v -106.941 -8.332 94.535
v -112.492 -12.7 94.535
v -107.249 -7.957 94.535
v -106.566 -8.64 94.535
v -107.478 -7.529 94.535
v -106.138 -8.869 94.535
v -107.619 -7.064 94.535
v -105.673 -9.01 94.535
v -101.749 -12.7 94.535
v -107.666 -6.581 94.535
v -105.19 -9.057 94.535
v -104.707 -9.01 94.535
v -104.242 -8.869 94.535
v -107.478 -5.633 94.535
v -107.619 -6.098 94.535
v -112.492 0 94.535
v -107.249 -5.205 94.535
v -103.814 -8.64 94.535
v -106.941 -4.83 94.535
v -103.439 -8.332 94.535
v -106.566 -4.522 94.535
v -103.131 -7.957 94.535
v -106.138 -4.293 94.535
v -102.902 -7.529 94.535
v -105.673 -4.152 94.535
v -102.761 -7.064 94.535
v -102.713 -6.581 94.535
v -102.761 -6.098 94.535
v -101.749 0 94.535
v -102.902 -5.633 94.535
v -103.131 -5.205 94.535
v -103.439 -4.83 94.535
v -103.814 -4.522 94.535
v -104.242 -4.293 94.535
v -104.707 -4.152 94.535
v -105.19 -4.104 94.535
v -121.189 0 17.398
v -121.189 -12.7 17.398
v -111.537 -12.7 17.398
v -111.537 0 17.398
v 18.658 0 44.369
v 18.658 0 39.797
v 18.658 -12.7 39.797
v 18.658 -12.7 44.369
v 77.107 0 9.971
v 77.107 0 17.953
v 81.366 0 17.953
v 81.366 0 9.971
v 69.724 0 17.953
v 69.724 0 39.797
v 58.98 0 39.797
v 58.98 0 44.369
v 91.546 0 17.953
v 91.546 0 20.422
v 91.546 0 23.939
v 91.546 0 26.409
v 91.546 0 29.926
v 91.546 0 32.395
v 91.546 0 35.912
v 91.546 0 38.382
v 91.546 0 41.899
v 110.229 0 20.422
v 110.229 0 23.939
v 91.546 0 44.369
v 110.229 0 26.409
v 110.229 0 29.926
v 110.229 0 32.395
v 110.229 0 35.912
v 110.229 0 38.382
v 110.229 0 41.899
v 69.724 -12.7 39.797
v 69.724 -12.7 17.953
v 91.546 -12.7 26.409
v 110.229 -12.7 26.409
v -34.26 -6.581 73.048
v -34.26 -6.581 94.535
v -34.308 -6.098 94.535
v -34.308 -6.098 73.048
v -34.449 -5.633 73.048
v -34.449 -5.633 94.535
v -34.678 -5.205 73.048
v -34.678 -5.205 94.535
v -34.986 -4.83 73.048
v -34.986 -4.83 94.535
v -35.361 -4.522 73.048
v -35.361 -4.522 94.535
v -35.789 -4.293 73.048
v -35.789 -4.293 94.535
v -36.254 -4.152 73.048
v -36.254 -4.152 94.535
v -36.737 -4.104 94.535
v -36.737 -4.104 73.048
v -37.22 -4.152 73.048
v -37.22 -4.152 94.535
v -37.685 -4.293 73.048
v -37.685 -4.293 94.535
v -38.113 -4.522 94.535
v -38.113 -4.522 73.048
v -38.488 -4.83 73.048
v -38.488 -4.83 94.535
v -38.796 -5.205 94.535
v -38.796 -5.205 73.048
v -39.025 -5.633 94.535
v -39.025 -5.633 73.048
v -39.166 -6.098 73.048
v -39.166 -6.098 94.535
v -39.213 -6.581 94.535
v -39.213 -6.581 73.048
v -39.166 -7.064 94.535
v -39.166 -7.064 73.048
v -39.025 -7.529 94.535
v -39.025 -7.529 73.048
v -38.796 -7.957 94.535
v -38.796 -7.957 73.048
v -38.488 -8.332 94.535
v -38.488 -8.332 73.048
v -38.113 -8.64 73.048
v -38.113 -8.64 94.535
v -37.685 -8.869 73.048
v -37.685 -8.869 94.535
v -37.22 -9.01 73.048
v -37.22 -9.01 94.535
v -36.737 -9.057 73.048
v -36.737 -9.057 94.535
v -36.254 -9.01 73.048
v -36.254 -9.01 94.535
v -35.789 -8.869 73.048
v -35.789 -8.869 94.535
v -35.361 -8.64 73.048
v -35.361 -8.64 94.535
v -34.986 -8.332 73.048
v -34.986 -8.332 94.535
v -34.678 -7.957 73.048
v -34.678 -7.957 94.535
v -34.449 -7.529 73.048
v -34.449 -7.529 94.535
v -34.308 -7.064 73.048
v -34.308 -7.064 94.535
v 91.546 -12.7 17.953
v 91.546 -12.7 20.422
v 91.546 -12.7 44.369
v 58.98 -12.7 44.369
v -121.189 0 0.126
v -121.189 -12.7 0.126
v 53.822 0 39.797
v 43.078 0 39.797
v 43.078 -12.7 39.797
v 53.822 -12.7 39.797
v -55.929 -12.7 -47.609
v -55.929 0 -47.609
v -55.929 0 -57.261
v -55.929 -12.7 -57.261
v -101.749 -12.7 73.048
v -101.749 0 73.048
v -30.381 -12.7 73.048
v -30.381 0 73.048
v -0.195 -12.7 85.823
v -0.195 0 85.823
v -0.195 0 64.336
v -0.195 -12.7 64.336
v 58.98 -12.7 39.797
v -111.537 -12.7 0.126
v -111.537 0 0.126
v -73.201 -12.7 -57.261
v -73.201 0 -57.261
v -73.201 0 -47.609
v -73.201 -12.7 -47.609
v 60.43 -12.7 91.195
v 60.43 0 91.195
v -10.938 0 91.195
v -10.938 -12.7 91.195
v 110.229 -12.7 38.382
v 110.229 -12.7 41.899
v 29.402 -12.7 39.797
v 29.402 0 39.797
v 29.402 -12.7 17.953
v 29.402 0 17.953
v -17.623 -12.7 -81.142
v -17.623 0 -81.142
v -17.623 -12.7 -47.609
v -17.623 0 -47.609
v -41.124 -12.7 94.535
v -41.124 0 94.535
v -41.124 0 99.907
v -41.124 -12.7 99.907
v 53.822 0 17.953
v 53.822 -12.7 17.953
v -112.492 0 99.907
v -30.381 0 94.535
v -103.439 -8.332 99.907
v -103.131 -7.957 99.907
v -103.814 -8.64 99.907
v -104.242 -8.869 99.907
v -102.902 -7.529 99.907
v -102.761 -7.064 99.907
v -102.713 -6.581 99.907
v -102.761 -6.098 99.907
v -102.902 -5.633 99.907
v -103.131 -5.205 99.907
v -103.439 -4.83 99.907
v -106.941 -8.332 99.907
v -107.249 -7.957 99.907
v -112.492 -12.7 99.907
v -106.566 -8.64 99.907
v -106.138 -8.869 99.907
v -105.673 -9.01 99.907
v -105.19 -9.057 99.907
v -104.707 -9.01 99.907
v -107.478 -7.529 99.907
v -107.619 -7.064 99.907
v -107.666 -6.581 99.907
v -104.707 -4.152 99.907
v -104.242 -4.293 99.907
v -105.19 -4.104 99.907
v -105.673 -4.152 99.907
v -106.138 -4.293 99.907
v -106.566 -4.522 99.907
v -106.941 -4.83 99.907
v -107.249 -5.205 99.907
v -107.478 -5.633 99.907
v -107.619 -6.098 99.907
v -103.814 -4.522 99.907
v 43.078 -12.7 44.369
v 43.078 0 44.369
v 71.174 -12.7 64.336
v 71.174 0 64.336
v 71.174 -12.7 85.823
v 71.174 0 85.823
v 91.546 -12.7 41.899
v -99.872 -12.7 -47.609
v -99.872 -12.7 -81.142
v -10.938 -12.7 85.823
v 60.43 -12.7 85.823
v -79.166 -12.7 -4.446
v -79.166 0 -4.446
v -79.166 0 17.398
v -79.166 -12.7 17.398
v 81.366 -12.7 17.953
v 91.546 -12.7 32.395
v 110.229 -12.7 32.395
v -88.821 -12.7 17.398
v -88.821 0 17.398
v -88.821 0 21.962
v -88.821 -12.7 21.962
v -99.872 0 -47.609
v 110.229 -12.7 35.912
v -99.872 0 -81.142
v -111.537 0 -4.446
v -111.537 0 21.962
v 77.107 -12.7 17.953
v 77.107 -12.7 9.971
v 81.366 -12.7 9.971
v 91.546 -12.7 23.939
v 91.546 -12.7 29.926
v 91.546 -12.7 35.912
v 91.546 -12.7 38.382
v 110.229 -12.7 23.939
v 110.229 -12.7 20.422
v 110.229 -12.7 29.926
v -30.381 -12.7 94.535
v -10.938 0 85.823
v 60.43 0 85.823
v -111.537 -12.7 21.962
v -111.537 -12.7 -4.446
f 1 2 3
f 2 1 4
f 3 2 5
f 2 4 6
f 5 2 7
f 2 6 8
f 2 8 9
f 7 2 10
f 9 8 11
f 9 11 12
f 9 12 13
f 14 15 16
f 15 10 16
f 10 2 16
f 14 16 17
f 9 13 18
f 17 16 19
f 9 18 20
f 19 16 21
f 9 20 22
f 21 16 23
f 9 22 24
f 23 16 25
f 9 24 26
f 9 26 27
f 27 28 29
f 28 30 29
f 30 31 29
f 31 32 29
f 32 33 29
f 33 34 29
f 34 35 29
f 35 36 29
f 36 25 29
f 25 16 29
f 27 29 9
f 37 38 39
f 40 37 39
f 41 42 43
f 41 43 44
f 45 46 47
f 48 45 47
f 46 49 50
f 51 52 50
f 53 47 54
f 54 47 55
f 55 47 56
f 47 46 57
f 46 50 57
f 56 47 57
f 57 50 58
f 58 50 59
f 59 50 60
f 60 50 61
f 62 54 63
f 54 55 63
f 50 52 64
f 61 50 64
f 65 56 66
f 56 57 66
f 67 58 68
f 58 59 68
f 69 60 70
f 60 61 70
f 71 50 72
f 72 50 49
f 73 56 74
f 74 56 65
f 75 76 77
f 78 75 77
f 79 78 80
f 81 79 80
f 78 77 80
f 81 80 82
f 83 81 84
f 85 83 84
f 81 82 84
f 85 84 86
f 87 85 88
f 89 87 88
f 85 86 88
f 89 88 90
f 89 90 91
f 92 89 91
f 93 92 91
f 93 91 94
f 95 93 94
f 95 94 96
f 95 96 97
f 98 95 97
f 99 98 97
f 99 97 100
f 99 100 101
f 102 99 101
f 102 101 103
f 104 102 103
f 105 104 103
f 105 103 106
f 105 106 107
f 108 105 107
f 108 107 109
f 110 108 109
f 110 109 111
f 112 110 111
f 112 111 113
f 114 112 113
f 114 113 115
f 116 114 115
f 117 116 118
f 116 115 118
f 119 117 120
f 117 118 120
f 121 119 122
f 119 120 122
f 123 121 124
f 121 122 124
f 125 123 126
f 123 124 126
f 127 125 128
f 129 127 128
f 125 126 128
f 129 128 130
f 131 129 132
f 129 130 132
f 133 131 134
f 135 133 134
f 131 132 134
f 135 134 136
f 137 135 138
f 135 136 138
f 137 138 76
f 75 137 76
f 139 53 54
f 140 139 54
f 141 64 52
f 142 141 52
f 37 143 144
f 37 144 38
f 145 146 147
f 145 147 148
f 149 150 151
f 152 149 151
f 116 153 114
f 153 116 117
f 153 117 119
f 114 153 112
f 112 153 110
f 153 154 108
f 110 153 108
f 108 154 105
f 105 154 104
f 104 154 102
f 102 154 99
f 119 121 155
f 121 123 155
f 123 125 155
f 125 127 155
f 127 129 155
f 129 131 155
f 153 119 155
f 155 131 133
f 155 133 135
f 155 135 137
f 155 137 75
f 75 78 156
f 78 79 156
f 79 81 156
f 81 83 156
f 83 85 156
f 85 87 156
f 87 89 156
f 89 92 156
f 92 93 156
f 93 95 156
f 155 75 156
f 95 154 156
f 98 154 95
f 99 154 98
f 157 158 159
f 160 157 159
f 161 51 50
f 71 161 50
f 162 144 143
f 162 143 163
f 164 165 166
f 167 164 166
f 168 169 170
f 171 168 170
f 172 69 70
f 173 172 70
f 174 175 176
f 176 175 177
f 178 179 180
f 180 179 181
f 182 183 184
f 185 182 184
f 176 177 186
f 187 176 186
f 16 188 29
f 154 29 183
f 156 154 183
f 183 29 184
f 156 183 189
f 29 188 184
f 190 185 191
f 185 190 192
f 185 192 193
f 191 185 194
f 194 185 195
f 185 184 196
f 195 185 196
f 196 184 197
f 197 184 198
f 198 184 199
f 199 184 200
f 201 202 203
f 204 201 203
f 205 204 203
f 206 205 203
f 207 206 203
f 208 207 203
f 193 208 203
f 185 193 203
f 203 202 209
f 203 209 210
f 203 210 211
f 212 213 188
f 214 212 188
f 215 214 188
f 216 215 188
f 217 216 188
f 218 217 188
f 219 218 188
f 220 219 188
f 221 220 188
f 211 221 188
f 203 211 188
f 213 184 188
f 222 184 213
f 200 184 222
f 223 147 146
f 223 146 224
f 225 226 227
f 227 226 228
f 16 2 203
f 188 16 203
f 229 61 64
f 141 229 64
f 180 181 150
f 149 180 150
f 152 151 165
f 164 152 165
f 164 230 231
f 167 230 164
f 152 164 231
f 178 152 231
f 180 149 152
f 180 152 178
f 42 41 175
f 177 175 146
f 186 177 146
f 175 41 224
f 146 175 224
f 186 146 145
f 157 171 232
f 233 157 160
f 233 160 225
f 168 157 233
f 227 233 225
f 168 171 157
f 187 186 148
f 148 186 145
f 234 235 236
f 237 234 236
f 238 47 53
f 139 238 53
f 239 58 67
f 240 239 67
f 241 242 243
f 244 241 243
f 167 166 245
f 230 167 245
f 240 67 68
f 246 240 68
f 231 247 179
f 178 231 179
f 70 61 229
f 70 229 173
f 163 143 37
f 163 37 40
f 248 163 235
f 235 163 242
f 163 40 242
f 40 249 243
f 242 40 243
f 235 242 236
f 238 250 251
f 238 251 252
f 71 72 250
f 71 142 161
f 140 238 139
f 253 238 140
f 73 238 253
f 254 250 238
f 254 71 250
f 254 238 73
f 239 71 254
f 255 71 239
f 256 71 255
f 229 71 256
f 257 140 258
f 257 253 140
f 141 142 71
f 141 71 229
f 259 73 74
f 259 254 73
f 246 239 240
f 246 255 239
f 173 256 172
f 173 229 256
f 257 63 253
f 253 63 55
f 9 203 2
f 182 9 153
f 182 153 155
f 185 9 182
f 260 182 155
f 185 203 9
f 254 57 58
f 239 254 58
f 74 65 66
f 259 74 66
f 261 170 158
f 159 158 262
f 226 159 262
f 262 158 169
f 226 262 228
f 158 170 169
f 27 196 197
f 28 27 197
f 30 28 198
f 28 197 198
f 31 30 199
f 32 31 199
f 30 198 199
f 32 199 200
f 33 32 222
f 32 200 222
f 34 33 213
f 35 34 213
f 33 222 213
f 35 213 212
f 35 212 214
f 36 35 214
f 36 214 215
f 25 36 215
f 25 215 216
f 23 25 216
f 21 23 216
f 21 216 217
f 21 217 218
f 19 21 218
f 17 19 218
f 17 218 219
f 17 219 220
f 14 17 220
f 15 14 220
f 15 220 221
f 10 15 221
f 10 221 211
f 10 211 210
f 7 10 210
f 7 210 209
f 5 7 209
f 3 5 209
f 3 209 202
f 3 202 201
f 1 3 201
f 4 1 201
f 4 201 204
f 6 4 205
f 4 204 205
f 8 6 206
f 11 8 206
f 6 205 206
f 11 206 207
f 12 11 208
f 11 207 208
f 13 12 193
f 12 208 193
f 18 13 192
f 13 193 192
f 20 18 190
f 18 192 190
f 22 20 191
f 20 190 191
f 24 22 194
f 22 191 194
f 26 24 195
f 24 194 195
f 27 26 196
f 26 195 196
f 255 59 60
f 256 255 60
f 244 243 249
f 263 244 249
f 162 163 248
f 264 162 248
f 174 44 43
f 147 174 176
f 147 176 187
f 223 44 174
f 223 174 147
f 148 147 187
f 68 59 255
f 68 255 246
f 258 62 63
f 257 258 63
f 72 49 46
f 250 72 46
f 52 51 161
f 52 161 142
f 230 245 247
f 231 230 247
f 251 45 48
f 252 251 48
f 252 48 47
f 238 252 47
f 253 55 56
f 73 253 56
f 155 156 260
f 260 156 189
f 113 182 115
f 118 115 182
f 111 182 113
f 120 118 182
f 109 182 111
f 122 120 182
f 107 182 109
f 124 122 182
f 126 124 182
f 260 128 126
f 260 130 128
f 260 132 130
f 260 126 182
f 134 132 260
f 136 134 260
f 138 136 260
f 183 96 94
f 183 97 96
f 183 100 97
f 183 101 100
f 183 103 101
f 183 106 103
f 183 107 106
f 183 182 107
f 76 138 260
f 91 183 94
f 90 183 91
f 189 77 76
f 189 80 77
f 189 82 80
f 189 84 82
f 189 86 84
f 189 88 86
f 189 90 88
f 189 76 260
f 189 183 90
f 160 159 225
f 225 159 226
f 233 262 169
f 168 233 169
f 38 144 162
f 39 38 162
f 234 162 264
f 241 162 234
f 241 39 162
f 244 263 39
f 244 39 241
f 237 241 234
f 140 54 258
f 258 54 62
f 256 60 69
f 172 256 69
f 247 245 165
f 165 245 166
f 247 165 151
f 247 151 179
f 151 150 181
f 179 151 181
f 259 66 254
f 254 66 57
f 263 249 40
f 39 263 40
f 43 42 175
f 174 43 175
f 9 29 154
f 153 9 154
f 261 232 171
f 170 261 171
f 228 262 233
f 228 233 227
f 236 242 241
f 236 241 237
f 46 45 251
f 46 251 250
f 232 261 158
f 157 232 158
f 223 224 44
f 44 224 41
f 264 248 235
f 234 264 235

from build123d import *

# Parameters (mm, degrees)
F0_W     = 10.7435509562
F0_H     = 5.3717717528
F0_H_2   = 17.2664299607
F0_H_3   = 4.2206794024
F1_DEPTH = 12.7
F2_DEPTH = 12.7
F0_W_2   = 9.654417634
F0_H_4   = 17.272
F0_W_3   = 9.652
F0_H_5   = 4.572
F3_DEPTH = 12.7
F4_DEPTH = 12.7
F5_R     = 2.4765
F6_DEPTH = 181.0494751265
F0_W_4   = 10.7442
F7_DEPTH = 12.7
F0_W_5   = 4.259288311
F0_H_6   = 7.9820062965
F0_W_6   = 18.6839207555
F0_H_7   = 3.5167981537
F8_DEPTH = 12.7


# Not quite as in the source:
# - a feature names something its author has since deleted; it is built from what else it names


with BuildPart() as f1:
    # F0 (on Front) → F1 (new body)
    with BuildSketch(Plane.XZ):
        Polygon((60.4302587326, 91.194928045), (-0.1946078347, 91.194928045), (-0.1946078347, 85.8231562922), (-0.1946078347, 68.5567263315), (-0.1946078347, 64.3360469291), (60.4302587326, 64.3360469291), (60.4302587326, 68.5567263315), (60.4302587326, 85.8231562922), align=None)
        with Locations((-5.5663833129, 88.5090421686)):
            Rectangle(F0_W, F0_H)
        with Locations((65.8020342107, 77.1899413118)):
            Rectangle(F0_W, F0_H_2)
        with Locations((65.8020342107, 66.4463866303)):
            Rectangle(F0_W, F0_H_3)
    extrude(amount=F1_DEPTH)


with BuildPart() as f2:
    # F0 (on Front) → F2 (new body)
    with BuildSketch(Plane.XZ):
        Polygon((-73.2007697225, -47.6094222765), (-99.8716428876, -47.6094222765), (-99.8716428876, -81.1416803997), (-17.6227167249, -81.1416803997), (-17.6227167249, -47.6094222765), (-55.9287697225, -47.6094222765), (-55.9287697225, -57.2614222765), (-73.2007697225, -57.2614222765), align=None)
    extrude(amount=F2_DEPTH)


with BuildPart() as f3:
    # F0 (on Front) → F3 (new body)
    with BuildSketch(Plane.XZ):
        Polygon((-88.8206250172, 21.9615809619), (-111.5369013648, 21.9615809619), (-111.5369013648, 17.3979116636), (-111.5369013648, 0.1259116636), (-111.5369013648, -4.4460883364), (-88.8206250172, -4.4460883364), (-88.8206250172, 0.1259116636), (-88.8206250172, 17.3979116636), align=None)
        with Locations((-83.9934162002, 8.7619116636)):
            Rectangle(F0_W_2, F0_H_4)
        with Locations((-116.3629013648, 8.7619116636)):
            Rectangle(F0_W_3, F0_H_4)
        with Locations((-83.9934162002, -2.1600883364)):
            Rectangle(F0_W_2, F0_H_5)
    extrude(amount=F3_DEPTH)


with BuildPart() as f4:
    # F0 (on Front) → F4 (new body)
    with BuildSketch(Plane.XZ):
        with Locations((-107.1205325425, 97.2209088504)):
            Rectangle(F0_W, F0_H)
        Polygon((-41.1243997514, 99.9067947268), (-101.7487570643, 99.9067947268), (-101.7487570643, 94.535022974), (-101.7487570643, 77.2685930133), (-101.7487570643, 73.0479136109), (-41.1243997514, 73.0479136109), (-41.1243997514, 77.2685930133), (-41.1243997514, 94.535022974), align=None)
        with Locations((-35.7526242733, 85.9018079937)):
            Rectangle(F0_W, F0_H_2)
        with Locations((-35.7526242733, 75.1582533121)):
            Rectangle(F0_W, F0_H_3)
    extrude(amount=F4_DEPTH)

    # F5 (on face) → F6 (cut, through all)
    with BuildSketch(Plane.XY.offset(99.9067947268)):
        with Locations((-105.1898080206, -6.5809087828)):
            Circle(F5_R)
        with Locations((-36.7368080206, -6.5809087828)):
            Circle(F5_R)
    extrude(amount=-F6_DEPTH, mode=Mode.SUBTRACT)


with BuildPart() as f7:
    # F0 (on Front) → F7 (new body)
    with BuildSketch(Plane.XZ):
        Polygon((43.0781543255, 44.3685778238), (29.4023611633, 44.3685778238), (29.4023611633, 39.7965778238), (29.4023611633, 22.5245778238), (29.4023611633, 17.9525778238), (43.0781543255, 17.9525778238), (43.0781543255, 22.5245778238), (43.0781543255, 39.7965778238), align=None)
        with Locations((24.0302611633, 42.0825778238)):
            Rectangle(F0_W_4, F0_H_5)
        with Locations((48.4502543255, 31.1605778238)):
            Rectangle(F0_W_4, F0_H_4)
        with Locations((48.4502543255, 20.2385778238)):
            Rectangle(F0_W_4, F0_H_5)
    extrude(amount=F7_DEPTH)


with BuildPart() as f8:
    # F0 (on Front) → F8 (new body)
    with BuildSketch(Plane.XZ):
        Polygon((69.7237410633, 44.3685778238), (69.7237410633, 39.7965778238), (69.7237410633, 22.5245778238), (69.7237410633, 17.9525778238), (77.106536278, 17.9525778238), (81.365824589, 17.9525778238), (91.5455787269, 17.9525778238), (91.5455787269, 19.9959375066), (91.5455787269, 20.4223393008), (91.5455787269, 23.6873332513), (91.5455787269, 23.9391374546), (91.5455787269, 26.4088989316), (91.5455787269, 28.5145420683), (91.5455787269, 29.9256970853), (91.5455787269, 32.205937813), (91.5455787269, 32.3954585623), (91.5455787269, 35.9122567161), (91.5455787269, 38.106836158), (91.5455787269, 38.3820181931), (91.5455787269, 41.8988163468), (91.5455787269, 44.3685778238), align=None)
        with Locations((79.2361804335, 13.9615746756)):
            Rectangle(F0_W_5, F0_H_6)
        with Locations((100.8875391047, 40.14041727)):
            Rectangle(F0_W_6, F0_H_7)
        with Locations((100.8875391047, 34.1538576392)):
            Rectangle(F0_W_6, F0_H_7)
        Polygon((110.2294994825, 29.9256970853), (91.5455787269, 29.9256970853), (91.5455787269, 28.5145420683), (91.5455787269, 26.4088989316), (110.2294994825, 26.4088989316), align=None)
        Polygon((91.5455787269, 23.6873332513), (91.5455787269, 20.4223393008), (110.2294994825, 20.4223393008), (110.2294994825, 23.9391374546), (91.5455787269, 23.9391374546), align=None)
        with Locations((64.3516410633, 42.0825778238)):
            Rectangle(F0_W_4, F0_H_5)
    extrude(amount=F8_DEPTH)


solid = Compound([f1.part, f2.part, f3.part, f4.part, f7.part, f8.part])
